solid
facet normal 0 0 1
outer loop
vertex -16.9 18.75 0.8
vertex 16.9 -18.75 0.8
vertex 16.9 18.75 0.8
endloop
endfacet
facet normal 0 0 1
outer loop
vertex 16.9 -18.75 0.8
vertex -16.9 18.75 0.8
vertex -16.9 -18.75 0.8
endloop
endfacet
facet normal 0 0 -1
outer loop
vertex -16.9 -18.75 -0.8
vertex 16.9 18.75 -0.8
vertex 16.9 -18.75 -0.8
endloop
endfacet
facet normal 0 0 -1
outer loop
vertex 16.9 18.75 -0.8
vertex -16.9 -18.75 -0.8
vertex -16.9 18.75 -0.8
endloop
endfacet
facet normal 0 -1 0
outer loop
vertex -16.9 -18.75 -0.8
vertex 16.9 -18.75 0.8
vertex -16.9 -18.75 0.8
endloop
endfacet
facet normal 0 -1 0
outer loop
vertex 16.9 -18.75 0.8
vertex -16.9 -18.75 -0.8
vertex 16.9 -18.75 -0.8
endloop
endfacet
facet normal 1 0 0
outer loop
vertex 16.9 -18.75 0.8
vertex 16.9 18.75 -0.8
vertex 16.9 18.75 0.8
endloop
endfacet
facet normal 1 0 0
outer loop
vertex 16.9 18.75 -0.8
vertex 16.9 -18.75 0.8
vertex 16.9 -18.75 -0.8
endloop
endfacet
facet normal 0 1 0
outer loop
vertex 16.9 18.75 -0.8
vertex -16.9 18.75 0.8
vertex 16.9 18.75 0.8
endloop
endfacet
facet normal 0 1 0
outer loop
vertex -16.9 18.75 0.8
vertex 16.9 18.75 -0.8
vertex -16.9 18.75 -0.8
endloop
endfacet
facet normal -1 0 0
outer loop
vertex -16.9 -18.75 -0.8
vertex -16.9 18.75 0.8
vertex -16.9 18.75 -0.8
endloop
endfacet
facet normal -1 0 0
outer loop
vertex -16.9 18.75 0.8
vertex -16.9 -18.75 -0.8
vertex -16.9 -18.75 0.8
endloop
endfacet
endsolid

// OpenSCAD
$fn=64;

board_x = 33.8;
board_y = 37.5;
board_th = 1.6;

module control_board(x=board_x, y=board_y, th=board_th) {
    translate([-x/2, -y/2, -th/2])
        cube([x, y, th], center=false);
}

control_board();
